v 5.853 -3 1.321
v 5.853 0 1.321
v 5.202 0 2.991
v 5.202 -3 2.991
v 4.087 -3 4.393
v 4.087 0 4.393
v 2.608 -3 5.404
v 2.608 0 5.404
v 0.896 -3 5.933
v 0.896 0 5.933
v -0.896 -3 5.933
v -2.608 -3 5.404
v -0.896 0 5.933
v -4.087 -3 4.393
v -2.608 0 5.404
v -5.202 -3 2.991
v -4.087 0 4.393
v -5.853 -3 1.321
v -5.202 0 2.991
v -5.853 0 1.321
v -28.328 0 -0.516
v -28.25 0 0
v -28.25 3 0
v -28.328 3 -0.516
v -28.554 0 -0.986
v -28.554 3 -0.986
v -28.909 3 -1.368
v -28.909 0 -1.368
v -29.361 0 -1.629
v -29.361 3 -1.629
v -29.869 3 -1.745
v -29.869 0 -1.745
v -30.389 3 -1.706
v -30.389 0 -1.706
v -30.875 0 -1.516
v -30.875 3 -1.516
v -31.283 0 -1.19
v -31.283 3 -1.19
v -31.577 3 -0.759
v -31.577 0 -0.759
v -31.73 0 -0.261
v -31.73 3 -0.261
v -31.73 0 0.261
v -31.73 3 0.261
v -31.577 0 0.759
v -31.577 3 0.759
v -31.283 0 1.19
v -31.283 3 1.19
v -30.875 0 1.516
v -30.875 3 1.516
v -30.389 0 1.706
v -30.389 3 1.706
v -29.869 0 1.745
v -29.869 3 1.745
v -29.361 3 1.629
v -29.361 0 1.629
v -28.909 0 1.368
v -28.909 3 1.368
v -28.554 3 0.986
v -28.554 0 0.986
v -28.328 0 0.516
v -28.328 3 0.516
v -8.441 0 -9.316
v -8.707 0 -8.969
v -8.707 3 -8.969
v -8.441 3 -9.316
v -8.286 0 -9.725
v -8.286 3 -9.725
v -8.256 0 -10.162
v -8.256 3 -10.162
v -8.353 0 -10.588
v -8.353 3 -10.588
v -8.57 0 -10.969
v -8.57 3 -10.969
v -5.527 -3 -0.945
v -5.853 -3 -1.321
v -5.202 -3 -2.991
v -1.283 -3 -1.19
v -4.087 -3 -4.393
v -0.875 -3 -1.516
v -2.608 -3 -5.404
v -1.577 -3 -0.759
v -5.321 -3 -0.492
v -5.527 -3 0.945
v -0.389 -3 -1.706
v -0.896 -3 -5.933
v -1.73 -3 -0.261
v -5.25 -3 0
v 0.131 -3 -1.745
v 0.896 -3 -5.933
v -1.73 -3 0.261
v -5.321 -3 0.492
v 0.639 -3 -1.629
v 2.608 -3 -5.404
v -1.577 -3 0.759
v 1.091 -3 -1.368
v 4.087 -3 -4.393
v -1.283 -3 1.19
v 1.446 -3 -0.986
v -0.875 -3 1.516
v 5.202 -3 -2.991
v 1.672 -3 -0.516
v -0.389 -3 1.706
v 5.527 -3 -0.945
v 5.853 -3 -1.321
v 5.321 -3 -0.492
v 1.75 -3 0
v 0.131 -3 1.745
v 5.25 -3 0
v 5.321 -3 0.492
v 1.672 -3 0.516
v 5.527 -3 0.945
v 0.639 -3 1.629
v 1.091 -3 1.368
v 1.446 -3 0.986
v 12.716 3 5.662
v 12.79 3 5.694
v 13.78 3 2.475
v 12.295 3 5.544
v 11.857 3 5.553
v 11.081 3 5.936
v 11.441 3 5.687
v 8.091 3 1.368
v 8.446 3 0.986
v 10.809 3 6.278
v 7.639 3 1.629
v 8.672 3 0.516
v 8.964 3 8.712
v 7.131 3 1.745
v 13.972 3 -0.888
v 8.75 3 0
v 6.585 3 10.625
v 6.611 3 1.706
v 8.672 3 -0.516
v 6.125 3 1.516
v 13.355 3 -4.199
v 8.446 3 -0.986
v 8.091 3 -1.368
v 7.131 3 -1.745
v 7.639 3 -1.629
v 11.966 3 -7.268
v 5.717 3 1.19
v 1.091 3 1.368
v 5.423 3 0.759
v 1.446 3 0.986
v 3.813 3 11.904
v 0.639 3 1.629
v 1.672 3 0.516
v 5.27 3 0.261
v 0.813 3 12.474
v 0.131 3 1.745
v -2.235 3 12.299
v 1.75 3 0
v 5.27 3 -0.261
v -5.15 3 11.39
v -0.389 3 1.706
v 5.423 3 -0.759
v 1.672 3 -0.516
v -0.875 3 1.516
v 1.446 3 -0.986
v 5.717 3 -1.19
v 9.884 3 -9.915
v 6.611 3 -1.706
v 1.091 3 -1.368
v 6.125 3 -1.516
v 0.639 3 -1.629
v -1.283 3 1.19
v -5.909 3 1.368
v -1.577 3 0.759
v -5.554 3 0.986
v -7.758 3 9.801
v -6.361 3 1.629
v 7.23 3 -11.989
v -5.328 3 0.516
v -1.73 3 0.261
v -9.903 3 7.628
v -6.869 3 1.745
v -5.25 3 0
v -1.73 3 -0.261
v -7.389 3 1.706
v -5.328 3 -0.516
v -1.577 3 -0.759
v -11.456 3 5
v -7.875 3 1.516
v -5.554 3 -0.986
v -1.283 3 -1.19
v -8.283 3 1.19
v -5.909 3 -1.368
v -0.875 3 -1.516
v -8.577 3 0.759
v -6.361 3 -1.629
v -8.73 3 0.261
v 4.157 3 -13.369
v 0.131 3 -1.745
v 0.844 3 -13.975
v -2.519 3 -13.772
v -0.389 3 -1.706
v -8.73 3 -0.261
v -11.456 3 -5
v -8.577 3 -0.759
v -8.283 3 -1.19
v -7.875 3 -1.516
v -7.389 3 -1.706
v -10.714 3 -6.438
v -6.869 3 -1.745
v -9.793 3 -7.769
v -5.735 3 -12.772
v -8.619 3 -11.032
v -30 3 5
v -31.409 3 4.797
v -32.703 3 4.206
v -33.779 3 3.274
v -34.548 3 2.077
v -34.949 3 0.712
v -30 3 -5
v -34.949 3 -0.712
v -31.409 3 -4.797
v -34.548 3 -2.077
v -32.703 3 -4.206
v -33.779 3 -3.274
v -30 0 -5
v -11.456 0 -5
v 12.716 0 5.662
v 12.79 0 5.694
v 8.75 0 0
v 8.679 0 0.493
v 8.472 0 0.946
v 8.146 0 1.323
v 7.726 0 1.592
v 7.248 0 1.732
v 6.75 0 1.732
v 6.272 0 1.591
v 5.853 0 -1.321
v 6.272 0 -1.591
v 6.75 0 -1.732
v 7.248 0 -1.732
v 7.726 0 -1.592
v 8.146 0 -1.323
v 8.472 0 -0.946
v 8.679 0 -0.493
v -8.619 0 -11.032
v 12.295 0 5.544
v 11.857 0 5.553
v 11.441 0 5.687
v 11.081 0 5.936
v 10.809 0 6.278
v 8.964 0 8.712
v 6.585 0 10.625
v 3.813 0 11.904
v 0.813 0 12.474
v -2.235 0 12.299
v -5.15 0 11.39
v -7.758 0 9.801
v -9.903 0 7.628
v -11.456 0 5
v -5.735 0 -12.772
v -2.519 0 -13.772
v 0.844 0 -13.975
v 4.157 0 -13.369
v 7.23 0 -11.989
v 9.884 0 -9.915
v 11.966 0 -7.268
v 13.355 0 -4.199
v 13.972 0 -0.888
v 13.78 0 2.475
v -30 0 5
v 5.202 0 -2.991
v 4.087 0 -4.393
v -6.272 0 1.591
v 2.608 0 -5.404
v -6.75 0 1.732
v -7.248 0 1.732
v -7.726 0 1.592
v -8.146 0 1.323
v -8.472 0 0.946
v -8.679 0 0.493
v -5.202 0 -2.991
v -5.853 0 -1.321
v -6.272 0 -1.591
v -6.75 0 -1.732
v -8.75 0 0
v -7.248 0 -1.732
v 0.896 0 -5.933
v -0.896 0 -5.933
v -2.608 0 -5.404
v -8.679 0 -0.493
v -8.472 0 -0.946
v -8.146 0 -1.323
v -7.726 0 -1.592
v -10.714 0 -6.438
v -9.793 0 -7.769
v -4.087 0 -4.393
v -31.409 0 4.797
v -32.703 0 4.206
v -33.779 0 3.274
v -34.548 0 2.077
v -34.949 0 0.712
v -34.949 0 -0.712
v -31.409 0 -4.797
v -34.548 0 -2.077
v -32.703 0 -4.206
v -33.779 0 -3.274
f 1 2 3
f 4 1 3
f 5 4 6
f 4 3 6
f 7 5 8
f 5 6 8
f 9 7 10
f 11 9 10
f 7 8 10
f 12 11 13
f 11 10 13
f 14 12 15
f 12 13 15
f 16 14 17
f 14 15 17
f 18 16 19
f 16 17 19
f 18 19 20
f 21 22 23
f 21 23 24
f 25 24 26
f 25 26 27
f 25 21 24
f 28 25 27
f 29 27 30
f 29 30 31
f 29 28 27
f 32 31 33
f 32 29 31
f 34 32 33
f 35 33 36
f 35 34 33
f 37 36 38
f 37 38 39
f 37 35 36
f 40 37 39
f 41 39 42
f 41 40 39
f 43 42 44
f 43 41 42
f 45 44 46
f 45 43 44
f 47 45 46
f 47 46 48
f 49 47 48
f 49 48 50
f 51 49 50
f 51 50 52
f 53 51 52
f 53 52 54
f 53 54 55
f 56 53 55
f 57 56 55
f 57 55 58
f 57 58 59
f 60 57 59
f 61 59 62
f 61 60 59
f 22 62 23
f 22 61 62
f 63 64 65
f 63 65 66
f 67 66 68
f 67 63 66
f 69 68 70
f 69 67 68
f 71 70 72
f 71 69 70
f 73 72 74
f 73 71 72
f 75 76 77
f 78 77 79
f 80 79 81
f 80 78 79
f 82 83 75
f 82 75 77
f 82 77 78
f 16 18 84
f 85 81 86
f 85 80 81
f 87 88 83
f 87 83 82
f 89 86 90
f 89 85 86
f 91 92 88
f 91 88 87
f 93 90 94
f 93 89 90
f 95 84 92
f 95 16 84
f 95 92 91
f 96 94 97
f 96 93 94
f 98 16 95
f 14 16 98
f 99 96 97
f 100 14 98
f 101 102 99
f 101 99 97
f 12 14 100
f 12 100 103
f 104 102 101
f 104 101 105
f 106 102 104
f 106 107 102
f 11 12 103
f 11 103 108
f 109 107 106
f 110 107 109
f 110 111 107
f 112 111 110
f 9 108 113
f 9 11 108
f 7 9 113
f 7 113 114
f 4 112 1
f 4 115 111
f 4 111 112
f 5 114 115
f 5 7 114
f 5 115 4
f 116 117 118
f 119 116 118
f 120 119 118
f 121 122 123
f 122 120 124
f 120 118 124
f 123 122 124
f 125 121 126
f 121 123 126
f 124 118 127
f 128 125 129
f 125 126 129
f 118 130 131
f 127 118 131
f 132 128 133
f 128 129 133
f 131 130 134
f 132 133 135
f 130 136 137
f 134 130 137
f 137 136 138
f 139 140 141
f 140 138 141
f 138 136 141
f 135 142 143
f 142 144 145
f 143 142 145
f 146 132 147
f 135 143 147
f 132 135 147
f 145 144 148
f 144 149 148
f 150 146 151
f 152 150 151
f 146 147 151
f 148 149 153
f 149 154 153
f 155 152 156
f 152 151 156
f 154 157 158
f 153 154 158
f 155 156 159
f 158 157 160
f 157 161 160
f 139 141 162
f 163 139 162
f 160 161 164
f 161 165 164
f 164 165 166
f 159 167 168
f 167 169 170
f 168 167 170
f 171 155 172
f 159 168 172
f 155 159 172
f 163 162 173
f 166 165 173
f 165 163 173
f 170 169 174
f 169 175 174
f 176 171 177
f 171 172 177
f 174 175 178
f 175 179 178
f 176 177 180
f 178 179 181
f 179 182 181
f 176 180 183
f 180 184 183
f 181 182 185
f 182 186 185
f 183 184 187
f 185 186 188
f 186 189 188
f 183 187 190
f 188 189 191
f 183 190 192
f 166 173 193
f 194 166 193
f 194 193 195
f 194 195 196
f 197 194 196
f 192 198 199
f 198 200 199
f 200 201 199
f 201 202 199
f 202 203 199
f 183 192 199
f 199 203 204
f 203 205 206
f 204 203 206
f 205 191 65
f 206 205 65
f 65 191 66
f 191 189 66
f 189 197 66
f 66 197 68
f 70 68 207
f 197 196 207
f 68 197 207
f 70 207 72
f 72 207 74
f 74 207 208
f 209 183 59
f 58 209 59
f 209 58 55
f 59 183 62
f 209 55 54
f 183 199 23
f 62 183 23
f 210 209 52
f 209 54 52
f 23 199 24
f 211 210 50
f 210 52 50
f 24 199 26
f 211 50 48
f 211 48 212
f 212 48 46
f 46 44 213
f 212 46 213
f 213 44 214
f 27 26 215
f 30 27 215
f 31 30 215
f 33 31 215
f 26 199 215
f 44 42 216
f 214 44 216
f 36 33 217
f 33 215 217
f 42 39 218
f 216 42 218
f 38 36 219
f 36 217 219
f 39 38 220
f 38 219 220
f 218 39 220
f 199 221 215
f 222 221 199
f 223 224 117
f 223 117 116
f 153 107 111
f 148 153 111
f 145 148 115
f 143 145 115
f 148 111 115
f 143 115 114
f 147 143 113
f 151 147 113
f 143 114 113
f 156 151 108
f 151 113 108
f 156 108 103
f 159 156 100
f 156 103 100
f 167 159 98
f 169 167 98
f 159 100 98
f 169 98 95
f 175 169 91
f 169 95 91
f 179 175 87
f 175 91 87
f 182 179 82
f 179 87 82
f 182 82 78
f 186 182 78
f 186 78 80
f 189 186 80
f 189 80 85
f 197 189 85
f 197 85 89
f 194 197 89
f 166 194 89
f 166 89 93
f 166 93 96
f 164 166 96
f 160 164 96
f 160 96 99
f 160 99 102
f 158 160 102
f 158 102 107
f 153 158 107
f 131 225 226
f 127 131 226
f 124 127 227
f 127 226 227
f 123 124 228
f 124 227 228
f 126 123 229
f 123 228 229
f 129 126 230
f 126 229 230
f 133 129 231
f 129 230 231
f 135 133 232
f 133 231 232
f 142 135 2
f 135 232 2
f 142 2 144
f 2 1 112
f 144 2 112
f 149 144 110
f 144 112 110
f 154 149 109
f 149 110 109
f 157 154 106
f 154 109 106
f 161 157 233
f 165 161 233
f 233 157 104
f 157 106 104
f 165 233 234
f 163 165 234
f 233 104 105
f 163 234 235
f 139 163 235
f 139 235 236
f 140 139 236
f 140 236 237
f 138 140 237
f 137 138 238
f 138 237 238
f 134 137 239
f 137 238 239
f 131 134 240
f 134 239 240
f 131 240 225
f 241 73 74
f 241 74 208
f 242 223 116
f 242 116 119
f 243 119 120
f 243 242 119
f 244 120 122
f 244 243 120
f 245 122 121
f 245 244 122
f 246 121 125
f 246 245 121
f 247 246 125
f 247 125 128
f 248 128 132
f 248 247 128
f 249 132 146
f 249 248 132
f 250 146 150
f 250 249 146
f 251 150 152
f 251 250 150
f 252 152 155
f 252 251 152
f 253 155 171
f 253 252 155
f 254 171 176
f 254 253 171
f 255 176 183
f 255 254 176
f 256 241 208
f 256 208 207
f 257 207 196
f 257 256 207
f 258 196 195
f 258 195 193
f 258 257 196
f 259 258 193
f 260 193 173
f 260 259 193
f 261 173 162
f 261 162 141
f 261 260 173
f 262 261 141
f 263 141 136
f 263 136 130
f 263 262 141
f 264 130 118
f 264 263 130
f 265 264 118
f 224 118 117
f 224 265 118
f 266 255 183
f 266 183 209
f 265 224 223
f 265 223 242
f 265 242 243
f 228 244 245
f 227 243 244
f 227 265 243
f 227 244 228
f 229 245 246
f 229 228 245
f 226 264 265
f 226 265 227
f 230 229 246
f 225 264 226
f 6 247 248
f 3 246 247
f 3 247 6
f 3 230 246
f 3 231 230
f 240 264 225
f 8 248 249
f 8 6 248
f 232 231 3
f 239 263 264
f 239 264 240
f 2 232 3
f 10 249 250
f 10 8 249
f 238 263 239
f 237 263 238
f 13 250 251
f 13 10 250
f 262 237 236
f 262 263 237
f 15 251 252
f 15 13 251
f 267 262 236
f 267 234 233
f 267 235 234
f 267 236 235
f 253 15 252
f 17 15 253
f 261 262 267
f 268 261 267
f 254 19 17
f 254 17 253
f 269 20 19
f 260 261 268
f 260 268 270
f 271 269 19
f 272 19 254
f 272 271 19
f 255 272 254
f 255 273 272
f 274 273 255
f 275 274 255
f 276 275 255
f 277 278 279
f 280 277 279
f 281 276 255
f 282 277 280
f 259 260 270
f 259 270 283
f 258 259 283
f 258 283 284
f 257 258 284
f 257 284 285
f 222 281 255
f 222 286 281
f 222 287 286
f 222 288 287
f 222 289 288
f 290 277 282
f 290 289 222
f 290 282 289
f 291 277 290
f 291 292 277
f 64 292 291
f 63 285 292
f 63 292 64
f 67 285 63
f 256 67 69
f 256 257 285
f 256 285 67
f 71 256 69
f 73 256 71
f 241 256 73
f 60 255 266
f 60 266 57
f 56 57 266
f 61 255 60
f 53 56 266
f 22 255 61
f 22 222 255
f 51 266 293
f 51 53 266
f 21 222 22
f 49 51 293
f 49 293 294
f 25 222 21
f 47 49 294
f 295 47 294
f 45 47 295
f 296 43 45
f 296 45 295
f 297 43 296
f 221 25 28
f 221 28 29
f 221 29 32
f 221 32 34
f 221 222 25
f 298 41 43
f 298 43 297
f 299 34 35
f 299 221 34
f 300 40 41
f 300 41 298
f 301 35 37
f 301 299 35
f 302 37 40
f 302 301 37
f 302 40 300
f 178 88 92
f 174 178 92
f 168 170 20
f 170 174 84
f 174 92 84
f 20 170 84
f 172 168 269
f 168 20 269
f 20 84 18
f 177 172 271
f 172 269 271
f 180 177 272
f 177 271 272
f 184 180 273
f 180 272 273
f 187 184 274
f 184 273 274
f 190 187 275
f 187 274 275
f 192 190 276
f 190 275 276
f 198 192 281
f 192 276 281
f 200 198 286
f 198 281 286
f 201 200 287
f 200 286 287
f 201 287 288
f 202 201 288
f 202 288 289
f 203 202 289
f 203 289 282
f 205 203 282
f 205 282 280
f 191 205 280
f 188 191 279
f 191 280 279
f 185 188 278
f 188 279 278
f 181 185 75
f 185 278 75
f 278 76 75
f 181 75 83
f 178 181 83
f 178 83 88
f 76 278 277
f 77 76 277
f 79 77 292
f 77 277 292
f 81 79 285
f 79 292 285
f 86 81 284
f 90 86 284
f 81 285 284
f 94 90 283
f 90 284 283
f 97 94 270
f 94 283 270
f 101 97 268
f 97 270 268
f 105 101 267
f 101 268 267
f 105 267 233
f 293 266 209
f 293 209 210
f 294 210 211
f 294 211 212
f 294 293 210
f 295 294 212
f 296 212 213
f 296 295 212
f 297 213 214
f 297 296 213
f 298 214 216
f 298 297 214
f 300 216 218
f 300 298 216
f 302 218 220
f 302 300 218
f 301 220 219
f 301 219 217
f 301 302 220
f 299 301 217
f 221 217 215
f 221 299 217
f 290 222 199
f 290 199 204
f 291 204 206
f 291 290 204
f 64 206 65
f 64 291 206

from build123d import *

# Parameters (mm, degrees)
SKETCH_1_R          = 1.75
EXTRUDE_1_DEPTH     = 3
SKETCH_2_R          = 6
EXTRUDE_2_DEPTH     = 3
SKETCH_3_R          = 1.75
CUT_EXTRUDE_1_DEPTH = 7


with BuildPart() as part:
    # Эскиз1 → Бобышка-Вытянуть1 (new body)
    with BuildSketch(Plane(origin=(0, 0, 0), x_dir=(1, 0, 0), z_dir=(0, 1, 0))):
        with BuildLine():
            Line((-30, 5), (-11.456439237, 5))
            ThreePointArc((-11.456439237, 5), (-10.2750901, 7.118463559), (-8.706840344, 8.968886844))
            ThreePointArc((-8.706840344, 8.968886844), (-8.255178852, 9.942485712), (-8.569645055, 10.968645479))
            Line((-8.569645055, 10.968645479), (-8.619260655, 11.03215055))
            ThreePointArc((-8.619260655, 11.03215055), (8.619260655, 11.03215055), (12.789636407, -5.694313003))
            Line((12.789636407, -5.694313003), (12.716014607, -5.661534466))
            ThreePointArc((12.716014607, -5.661534466), (11.644259912, -5.604659769), (10.808847895, -6.278439868))
            ThreePointArc((10.808847895, -6.278439868), (-0.716551297, -12.47944527), (-11.456439237, -5))
            Line((-11.456439237, -5), (-30, -5))
            ThreePointArc((-30, -5), (-35, 0), (-30, 5))
        make_face()
        with Locations((-30, 0)):
            Circle(SKETCH_1_R, mode=Mode.SUBTRACT)
    extrude(amount=EXTRUDE_1_DEPTH)

    # Эскиз2 → Бобышка-Вытянуть2 (add)
    with BuildSketch(Plane.XZ):
        Circle(SKETCH_2_R)
    extrude(amount=EXTRUDE_2_DEPTH)

    # Эскиз3 → Вырез-Вытянуть1 (cut, through all)
    with BuildSketch(Plane.XZ.offset(3)):
        Circle(SKETCH_3_R)
        with Locations((-7, 0)):
            Circle(SKETCH_3_R)
        with Locations((7, 0)):
            Circle(SKETCH_3_R)
    extrude(amount=-CUT_EXTRUDE_1_DEPTH, mode=Mode.SUBTRACT)


solid = part.part
